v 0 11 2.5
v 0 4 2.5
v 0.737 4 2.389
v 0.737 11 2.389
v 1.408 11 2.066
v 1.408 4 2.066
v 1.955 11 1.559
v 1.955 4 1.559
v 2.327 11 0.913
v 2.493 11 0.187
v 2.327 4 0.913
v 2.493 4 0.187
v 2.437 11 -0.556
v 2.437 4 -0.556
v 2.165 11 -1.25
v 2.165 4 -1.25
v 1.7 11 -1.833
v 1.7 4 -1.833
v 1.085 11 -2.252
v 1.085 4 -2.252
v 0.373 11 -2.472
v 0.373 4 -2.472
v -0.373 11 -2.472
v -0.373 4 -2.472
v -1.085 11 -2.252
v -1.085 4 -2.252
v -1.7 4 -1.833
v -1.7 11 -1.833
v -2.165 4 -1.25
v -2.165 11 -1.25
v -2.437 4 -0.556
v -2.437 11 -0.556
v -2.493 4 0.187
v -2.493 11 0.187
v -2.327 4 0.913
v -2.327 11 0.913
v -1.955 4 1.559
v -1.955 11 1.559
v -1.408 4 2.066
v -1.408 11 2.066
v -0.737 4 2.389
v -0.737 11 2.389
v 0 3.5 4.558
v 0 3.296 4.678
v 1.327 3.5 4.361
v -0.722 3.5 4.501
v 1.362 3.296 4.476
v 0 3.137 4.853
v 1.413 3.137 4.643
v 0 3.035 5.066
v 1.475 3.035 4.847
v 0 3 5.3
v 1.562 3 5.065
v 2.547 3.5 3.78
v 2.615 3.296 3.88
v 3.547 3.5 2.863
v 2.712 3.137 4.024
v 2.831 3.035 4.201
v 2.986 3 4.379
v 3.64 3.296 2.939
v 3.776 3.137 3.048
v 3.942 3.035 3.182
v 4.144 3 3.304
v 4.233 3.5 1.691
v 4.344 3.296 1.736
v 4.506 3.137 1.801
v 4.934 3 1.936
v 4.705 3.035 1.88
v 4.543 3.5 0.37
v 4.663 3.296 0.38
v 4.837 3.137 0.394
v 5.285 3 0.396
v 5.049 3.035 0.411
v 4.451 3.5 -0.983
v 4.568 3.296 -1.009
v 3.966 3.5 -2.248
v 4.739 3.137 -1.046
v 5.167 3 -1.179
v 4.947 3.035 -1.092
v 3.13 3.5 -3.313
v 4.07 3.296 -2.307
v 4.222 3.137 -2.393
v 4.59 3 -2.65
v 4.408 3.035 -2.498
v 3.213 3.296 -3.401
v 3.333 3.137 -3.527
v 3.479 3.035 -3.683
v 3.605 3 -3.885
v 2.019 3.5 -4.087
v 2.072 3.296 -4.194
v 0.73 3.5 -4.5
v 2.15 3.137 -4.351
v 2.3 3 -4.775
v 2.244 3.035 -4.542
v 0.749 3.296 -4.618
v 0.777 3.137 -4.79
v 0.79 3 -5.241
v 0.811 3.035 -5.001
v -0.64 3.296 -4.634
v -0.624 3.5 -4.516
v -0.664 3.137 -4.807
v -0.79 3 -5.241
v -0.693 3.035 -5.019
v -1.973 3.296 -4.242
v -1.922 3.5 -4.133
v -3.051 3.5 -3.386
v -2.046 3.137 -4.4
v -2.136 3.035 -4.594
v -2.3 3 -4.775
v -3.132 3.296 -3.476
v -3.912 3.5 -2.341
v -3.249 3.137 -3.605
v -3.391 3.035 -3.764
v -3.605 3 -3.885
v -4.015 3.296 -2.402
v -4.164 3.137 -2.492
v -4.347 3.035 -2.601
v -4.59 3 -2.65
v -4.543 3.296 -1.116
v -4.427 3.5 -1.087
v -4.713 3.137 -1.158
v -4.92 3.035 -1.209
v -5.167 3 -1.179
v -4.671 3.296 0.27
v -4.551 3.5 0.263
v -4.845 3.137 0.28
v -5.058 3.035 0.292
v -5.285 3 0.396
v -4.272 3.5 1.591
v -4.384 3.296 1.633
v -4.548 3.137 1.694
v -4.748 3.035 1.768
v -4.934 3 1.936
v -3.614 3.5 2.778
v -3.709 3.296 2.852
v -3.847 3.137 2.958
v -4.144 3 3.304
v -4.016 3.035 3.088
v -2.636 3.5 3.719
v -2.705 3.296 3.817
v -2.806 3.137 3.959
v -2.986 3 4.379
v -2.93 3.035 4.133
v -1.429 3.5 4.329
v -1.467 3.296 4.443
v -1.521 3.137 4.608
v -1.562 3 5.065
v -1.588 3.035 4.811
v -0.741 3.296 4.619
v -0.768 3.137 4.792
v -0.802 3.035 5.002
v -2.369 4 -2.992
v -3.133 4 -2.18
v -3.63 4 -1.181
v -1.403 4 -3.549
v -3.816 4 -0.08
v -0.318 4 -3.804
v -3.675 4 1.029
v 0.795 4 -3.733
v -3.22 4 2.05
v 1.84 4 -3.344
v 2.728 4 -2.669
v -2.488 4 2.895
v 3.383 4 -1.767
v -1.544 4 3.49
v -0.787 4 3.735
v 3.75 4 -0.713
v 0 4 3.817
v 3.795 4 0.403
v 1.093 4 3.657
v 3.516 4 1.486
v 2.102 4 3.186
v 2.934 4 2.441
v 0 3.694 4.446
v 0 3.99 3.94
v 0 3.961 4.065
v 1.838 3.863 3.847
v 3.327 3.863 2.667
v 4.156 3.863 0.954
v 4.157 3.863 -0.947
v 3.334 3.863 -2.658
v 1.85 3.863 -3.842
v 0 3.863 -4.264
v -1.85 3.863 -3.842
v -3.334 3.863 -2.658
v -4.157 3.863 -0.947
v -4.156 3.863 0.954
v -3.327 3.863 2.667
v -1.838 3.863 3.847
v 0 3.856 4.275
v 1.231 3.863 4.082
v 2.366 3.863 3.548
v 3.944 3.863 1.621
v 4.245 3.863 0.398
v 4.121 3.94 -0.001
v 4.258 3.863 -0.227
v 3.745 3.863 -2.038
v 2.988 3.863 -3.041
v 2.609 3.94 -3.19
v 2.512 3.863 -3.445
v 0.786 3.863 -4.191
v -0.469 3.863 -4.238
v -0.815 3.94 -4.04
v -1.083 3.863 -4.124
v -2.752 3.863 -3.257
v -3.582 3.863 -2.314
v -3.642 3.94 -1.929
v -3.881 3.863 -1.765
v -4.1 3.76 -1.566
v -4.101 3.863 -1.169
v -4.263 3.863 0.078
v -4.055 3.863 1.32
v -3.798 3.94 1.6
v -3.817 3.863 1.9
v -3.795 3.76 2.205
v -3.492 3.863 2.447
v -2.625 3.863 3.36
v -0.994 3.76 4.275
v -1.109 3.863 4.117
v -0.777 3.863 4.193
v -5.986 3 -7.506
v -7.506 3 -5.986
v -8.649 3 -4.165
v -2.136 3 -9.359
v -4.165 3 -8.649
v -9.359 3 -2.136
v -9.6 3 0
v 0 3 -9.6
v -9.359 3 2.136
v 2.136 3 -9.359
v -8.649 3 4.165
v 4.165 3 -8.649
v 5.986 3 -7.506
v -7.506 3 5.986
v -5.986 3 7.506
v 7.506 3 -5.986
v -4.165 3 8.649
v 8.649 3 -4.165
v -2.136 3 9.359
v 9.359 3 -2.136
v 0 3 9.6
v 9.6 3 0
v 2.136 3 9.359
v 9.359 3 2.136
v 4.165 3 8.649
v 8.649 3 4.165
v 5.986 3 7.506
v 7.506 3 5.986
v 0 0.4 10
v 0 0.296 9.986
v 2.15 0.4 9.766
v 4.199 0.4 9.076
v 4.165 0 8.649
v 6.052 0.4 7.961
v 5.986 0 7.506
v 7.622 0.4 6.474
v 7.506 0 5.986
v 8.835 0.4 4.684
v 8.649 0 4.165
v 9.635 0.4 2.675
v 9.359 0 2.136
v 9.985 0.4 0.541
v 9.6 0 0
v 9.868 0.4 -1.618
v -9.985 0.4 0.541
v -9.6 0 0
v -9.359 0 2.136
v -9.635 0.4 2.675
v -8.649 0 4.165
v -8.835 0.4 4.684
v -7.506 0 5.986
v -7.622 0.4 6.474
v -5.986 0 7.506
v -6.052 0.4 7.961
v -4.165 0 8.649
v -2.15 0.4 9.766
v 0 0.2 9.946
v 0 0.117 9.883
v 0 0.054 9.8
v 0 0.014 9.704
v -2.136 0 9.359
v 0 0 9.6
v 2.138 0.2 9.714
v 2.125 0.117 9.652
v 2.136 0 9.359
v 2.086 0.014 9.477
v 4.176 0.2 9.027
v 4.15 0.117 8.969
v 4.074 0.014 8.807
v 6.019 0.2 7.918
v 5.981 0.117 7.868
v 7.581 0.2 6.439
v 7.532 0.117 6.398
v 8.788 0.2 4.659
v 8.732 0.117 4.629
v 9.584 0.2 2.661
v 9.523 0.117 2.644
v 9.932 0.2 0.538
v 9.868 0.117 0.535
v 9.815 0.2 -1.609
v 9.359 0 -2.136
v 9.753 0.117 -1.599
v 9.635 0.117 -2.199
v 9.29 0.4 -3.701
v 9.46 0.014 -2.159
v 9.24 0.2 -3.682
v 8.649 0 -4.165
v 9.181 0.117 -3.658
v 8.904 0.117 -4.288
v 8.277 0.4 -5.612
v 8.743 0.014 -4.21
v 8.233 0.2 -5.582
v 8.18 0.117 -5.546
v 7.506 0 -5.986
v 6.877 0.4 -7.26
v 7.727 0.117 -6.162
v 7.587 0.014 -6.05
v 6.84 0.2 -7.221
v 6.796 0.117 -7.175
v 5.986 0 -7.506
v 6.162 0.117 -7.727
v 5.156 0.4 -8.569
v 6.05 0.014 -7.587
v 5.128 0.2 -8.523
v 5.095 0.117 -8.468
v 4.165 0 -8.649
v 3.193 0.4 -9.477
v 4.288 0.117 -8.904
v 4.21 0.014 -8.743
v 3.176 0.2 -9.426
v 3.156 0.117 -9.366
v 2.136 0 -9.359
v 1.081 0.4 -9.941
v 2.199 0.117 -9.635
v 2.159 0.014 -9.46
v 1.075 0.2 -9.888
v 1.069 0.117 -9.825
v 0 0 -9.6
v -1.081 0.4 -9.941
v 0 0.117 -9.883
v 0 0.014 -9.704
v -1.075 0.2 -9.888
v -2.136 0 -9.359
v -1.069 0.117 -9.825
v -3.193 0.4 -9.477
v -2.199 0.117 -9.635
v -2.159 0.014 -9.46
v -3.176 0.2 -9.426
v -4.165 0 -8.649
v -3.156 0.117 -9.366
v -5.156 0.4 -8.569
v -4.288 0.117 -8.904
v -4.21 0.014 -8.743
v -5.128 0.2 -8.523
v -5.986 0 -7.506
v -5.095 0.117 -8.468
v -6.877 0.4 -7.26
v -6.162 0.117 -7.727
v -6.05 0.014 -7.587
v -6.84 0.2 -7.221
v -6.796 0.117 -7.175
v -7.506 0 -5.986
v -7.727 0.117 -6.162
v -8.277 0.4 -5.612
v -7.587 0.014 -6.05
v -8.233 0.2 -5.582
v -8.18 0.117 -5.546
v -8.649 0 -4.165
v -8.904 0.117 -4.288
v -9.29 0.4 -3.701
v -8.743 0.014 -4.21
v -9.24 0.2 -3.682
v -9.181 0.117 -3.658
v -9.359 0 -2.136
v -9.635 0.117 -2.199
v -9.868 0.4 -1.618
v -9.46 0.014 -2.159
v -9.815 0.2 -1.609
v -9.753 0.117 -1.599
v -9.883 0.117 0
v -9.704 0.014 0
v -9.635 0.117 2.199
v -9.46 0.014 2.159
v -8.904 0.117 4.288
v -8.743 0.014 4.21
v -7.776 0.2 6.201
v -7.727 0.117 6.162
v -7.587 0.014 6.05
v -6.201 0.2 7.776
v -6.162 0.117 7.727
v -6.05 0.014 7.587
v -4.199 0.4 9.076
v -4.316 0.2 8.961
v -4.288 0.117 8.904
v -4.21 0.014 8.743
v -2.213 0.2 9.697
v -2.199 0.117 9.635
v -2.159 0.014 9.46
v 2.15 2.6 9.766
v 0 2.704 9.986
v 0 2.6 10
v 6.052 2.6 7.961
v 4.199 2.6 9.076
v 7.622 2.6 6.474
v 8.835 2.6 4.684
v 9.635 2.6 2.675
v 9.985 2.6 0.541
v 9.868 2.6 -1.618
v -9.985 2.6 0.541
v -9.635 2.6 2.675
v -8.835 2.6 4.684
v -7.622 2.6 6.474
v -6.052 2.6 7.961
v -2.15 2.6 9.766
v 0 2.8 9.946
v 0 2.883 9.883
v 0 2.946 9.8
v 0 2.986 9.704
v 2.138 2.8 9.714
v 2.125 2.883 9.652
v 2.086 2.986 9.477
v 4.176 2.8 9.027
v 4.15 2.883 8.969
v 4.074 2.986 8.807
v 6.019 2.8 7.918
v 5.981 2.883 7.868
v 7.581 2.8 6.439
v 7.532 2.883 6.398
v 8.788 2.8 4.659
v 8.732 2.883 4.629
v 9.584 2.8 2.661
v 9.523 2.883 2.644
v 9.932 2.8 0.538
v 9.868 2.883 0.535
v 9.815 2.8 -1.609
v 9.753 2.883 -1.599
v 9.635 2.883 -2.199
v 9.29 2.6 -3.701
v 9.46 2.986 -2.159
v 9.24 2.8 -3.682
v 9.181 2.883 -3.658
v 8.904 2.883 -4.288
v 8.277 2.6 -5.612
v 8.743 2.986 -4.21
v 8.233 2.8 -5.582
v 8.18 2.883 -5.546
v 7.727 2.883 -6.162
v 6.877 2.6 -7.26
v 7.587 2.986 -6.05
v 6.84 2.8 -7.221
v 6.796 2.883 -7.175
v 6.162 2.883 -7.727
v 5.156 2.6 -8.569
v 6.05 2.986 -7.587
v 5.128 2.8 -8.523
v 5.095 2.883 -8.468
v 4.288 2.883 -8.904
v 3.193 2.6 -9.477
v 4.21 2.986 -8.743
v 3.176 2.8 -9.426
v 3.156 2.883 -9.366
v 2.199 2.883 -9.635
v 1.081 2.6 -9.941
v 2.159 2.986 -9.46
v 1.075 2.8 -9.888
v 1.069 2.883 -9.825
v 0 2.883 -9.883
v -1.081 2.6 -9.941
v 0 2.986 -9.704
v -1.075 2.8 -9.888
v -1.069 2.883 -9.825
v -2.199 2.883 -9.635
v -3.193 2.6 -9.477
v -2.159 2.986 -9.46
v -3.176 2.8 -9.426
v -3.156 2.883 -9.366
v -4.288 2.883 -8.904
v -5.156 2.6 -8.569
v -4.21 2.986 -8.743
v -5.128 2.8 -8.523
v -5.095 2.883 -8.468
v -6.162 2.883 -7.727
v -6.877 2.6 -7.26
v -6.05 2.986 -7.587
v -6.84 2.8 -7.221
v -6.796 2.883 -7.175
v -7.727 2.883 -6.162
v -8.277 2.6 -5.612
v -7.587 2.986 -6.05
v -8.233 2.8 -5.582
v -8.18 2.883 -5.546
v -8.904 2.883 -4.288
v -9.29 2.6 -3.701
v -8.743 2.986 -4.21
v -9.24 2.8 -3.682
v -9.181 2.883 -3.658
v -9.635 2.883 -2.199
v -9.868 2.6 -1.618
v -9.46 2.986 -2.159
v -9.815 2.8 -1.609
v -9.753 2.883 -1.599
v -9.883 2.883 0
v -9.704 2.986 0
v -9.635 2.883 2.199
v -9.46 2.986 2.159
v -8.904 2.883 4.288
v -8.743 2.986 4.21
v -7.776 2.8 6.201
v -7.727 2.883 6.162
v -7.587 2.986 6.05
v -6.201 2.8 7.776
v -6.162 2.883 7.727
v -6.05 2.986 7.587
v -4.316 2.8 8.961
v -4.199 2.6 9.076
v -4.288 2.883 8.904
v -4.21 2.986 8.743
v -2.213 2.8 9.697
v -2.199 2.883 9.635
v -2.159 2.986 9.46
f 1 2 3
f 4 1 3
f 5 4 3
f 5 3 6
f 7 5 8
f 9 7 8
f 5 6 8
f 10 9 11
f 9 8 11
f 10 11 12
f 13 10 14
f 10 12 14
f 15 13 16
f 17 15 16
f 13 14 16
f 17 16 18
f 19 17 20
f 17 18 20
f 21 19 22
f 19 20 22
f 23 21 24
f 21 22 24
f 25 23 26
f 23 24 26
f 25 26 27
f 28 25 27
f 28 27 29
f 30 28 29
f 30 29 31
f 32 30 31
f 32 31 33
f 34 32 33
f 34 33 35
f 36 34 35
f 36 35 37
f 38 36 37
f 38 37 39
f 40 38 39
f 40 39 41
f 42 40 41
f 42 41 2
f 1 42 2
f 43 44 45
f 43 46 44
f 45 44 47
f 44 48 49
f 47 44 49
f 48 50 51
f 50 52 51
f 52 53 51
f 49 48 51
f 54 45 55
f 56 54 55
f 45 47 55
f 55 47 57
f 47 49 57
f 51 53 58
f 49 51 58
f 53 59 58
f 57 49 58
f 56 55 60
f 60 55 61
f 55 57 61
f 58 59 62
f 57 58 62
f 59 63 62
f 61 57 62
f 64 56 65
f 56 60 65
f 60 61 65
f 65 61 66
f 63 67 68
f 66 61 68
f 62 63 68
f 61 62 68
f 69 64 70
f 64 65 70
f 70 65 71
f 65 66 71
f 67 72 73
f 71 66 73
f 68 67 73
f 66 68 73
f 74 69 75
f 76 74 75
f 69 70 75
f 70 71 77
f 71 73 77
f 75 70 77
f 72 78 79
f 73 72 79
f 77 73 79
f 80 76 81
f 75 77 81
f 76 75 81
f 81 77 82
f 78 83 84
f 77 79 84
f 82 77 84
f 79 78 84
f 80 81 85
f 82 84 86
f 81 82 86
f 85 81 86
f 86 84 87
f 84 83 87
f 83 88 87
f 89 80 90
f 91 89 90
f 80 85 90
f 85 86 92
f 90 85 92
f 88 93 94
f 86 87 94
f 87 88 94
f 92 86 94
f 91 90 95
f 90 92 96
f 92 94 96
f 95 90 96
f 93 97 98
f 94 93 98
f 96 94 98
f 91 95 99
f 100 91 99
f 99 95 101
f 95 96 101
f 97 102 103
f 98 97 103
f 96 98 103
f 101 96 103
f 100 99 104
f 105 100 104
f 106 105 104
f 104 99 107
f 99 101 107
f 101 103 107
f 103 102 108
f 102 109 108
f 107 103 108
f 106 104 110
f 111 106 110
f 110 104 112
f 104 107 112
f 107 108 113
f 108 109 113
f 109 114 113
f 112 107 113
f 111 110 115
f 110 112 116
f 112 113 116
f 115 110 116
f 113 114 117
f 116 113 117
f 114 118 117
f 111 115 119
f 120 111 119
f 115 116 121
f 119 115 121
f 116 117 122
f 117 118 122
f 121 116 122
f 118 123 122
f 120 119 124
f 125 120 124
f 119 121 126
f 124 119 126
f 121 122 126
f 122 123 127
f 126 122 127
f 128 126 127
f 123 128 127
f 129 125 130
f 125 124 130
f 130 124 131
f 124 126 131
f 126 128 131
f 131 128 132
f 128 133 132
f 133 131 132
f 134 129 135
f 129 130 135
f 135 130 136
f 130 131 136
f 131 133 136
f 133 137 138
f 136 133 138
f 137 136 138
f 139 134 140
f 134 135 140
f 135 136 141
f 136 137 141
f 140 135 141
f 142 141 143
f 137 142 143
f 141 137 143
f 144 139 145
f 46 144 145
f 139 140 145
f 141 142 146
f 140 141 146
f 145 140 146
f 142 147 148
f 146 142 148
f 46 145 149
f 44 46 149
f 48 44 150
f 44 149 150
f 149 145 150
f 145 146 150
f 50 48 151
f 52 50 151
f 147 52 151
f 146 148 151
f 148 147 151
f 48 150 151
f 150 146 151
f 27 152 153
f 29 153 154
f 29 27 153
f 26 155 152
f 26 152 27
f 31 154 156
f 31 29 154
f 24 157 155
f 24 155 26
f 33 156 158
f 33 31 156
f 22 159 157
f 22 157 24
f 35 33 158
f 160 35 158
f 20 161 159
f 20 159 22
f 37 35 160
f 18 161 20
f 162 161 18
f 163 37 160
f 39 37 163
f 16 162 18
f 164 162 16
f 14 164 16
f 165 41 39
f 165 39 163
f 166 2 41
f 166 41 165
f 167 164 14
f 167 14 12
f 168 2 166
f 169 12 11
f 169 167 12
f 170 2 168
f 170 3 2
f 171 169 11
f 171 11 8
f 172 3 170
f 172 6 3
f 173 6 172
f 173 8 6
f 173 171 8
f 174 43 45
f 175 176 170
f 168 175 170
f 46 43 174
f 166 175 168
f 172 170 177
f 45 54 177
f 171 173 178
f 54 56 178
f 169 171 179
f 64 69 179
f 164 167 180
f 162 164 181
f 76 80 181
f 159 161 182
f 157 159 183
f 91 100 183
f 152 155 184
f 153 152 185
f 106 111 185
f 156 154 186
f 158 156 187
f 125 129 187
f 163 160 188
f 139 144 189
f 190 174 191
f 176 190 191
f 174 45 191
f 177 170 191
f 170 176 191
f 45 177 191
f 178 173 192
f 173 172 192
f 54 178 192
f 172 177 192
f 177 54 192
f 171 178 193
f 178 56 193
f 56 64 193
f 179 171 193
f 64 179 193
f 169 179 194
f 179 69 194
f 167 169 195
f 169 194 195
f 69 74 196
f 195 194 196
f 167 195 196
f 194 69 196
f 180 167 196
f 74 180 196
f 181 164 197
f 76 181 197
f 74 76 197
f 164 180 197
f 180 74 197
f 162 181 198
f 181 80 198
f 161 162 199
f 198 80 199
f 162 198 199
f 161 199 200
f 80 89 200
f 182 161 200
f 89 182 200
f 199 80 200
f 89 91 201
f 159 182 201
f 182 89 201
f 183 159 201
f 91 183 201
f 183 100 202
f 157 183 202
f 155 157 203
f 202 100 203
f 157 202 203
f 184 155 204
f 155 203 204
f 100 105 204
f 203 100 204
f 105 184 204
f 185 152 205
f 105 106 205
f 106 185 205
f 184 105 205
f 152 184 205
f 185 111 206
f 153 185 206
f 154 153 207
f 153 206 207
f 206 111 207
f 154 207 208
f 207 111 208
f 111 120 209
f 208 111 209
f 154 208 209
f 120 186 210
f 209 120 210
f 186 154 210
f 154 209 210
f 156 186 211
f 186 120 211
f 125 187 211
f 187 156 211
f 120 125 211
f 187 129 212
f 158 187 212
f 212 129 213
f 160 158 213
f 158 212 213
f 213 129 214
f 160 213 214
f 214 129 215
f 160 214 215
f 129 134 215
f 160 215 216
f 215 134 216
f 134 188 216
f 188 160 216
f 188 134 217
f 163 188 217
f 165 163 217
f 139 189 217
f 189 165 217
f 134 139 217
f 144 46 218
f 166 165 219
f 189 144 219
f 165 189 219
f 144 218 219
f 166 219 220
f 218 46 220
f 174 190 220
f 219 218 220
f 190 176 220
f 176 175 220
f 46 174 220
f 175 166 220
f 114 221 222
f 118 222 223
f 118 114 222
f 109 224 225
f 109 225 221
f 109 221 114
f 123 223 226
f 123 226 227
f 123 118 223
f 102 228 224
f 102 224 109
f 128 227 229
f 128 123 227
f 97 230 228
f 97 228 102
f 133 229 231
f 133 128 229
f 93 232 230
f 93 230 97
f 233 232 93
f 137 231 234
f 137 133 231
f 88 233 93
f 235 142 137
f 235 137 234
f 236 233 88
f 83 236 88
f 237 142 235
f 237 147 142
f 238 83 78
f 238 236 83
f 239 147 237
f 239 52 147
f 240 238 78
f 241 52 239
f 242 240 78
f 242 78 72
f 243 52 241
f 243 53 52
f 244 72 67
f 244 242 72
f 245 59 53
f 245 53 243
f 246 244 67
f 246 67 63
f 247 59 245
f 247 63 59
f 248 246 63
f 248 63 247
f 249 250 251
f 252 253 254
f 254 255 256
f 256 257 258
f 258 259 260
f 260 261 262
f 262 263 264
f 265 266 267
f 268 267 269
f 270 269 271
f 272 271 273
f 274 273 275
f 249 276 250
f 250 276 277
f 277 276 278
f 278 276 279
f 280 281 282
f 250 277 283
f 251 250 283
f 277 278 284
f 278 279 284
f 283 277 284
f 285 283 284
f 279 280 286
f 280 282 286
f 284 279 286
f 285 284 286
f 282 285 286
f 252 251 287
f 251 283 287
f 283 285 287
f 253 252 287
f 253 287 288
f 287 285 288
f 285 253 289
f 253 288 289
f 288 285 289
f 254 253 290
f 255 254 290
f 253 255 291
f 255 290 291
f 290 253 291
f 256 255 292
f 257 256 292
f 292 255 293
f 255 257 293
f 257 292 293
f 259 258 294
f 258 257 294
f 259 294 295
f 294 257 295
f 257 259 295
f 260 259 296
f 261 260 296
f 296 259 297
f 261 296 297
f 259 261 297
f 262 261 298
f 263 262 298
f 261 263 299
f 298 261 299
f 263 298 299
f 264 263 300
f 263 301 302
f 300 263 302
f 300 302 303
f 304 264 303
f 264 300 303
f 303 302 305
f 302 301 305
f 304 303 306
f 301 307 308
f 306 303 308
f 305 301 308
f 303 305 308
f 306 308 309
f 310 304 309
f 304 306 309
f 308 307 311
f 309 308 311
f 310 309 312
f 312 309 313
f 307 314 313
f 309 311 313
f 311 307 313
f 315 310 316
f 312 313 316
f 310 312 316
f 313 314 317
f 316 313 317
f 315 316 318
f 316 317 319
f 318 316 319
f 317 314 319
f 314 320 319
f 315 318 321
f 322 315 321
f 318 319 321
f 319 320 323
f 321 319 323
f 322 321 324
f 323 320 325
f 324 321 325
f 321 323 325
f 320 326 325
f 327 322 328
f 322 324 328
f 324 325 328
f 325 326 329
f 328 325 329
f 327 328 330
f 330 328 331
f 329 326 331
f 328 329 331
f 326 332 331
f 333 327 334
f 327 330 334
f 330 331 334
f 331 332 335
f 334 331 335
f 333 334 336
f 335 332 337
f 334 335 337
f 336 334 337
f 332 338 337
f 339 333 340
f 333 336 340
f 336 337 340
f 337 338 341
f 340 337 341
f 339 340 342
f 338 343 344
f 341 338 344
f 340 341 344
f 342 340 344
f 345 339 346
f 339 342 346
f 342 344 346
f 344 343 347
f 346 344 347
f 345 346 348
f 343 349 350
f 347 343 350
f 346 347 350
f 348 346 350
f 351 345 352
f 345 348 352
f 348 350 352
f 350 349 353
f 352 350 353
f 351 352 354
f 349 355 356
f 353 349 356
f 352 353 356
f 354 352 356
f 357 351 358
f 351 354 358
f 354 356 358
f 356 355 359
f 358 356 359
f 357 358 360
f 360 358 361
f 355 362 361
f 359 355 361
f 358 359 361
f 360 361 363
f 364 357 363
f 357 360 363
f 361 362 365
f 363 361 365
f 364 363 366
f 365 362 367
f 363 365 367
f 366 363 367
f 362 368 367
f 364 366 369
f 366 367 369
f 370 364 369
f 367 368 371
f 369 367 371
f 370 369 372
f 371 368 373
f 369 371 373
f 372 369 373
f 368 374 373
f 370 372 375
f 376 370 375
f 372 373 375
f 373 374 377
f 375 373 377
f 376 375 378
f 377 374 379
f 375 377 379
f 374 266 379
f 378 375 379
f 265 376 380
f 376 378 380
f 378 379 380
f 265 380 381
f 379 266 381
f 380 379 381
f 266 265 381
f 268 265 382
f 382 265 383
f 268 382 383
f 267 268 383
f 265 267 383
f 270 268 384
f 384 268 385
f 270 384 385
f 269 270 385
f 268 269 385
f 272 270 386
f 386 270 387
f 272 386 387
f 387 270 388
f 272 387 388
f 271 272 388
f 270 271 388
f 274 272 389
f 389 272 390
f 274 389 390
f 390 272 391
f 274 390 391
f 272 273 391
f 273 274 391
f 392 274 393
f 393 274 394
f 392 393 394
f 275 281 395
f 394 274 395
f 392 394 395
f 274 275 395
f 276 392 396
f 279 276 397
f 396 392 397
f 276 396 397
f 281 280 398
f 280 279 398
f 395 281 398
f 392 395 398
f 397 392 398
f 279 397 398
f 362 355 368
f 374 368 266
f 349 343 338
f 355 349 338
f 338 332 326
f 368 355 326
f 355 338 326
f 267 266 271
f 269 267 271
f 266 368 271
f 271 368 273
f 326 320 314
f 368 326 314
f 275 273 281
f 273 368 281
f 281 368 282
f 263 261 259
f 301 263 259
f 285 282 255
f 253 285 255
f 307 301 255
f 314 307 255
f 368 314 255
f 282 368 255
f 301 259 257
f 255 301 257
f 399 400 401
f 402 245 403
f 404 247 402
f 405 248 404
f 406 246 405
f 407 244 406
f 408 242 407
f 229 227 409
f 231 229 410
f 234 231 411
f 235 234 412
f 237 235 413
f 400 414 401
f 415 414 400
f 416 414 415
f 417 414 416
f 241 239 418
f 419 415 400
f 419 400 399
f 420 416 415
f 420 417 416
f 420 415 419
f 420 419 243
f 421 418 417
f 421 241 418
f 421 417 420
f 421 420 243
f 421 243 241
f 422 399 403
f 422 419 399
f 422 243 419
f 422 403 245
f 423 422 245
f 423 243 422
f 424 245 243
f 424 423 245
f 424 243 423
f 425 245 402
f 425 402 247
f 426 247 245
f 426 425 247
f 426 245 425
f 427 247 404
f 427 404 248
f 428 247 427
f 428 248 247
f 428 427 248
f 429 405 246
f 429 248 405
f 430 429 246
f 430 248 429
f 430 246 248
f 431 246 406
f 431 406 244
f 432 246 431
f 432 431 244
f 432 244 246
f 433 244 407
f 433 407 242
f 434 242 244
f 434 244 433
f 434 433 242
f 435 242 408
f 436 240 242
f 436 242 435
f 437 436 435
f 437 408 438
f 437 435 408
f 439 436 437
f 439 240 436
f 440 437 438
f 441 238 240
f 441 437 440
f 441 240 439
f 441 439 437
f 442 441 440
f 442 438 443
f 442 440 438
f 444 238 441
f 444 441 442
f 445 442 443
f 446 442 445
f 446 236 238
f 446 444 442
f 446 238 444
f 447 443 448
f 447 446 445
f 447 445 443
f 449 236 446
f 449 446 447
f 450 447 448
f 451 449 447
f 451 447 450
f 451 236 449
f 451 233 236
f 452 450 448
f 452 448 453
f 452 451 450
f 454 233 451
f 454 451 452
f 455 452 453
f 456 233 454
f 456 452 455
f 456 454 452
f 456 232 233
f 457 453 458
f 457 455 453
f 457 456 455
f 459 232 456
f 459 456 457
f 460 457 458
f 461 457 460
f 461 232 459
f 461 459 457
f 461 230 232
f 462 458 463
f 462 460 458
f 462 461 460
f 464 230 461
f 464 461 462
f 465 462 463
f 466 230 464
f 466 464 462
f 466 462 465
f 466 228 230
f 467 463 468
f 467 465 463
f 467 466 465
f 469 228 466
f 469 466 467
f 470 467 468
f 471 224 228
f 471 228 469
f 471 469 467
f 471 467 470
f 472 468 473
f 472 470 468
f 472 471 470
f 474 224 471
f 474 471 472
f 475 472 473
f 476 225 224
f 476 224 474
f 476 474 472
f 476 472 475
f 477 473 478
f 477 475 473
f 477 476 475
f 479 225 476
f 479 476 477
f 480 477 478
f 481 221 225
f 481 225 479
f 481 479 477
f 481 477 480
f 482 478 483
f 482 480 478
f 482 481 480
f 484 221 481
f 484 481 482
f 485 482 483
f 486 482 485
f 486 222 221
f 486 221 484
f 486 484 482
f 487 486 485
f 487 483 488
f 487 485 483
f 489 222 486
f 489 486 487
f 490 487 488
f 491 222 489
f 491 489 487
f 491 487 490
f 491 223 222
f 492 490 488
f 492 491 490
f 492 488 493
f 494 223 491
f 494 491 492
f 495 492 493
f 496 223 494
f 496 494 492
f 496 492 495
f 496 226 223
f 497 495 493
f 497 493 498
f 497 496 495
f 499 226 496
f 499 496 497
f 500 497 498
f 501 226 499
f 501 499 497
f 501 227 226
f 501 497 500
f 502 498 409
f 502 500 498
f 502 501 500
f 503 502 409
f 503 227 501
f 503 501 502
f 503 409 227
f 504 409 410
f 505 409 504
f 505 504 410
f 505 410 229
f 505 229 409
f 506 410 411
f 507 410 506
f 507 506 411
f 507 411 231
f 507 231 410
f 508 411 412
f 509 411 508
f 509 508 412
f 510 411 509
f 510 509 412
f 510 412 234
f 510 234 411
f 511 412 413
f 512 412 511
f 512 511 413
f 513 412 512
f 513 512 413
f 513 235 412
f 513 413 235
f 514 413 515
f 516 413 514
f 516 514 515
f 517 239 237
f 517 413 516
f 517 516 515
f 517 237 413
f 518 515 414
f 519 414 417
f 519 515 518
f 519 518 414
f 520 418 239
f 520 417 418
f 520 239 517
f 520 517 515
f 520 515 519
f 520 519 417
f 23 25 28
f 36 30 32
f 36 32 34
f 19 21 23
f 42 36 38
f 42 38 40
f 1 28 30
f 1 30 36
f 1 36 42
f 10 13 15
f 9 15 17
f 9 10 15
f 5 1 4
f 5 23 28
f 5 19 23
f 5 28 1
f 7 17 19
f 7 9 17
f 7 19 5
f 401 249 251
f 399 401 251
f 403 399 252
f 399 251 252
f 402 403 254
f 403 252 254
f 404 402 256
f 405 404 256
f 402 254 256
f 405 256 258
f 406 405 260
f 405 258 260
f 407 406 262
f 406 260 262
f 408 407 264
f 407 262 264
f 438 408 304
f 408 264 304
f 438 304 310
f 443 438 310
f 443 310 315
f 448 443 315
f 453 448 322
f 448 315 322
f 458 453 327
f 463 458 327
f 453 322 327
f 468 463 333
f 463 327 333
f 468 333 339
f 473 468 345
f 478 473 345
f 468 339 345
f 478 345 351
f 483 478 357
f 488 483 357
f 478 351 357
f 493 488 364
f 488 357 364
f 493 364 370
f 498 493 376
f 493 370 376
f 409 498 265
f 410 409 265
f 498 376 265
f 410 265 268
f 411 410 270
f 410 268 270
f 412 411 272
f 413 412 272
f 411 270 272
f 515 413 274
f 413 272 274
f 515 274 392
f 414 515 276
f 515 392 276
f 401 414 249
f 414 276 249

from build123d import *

# Parameters (mm, degrees)
SKETCH1_R           = 10
BOSS_EXTRUDE1_DEPTH = 3
SKETCH2_R           = 2.5
BOSS_EXTRUDE2_DEPTH = 8
FILLET2_R           = 0.4
SKETCH3_R           = 4.5
SKETCH3_R_2         = 2.5
BOSS_EXTRUDE3_DEPTH = 1
FILLET3_R           = 0.8
FILLET4_R           = 0.8


with BuildPart() as part:
    # Sketch1 → Boss-Extrude1 (new body)
    with BuildSketch(Plane(origin=(0, 0, 0), x_dir=(1, 0, 0), z_dir=(0, 1, 0))):
        with Locations(Location((0, 0, 0), (0, 0, 270))):
            Circle(SKETCH1_R)
    extrude(amount=BOSS_EXTRUDE1_DEPTH)

    # Sketch2 → Boss-Extrude2 (add)
    with BuildSketch(Plane(origin=(0, 3, 0), x_dir=(1, 0, 0), z_dir=(0, 1, 0))):
        with Locations(Location((0, 0, 0), (0, 0, 270))):
            Circle(SKETCH2_R)
    extrude(amount=BOSS_EXTRUDE2_DEPTH)

    # Fillet2
    fillet2_edges = [part.edges().sort_by_distance(p)[0] for p in [
        (0, 0, -10),
        (0, 3, -10),
    ]]
    fillet(fillet2_edges, radius=FILLET2_R)

    # Sketch3 → Boss-Extrude3 (add)
    with BuildSketch(Plane(origin=(0, 3, 0), x_dir=(1, 0, 0), z_dir=(0, 1, 0))):
        with Locations(Location((0, 0, 0), (0, 0, 270))):
            Circle(SKETCH3_R)
        with Locations(Location((0, 0, 0), (0, 0, 270))):
            Circle(SKETCH3_R_2, mode=Mode.SUBTRACT)
    extrude(amount=BOSS_EXTRUDE3_DEPTH)

    # Fillet3
    fillet3_edges = [part.edges().sort_by_distance(p)[0] for p in [
        (0, 3, -4.5),
    ]]
    fillet(fillet3_edges, radius=FILLET3_R)

    # Fillet4
    fillet4_edges = [part.edges().sort_by_distance(p)[0] for p in [
        (0, 4, -4.5),
    ]]
    fillet(fillet4_edges, radius=FILLET4_R)


solid = part.part
